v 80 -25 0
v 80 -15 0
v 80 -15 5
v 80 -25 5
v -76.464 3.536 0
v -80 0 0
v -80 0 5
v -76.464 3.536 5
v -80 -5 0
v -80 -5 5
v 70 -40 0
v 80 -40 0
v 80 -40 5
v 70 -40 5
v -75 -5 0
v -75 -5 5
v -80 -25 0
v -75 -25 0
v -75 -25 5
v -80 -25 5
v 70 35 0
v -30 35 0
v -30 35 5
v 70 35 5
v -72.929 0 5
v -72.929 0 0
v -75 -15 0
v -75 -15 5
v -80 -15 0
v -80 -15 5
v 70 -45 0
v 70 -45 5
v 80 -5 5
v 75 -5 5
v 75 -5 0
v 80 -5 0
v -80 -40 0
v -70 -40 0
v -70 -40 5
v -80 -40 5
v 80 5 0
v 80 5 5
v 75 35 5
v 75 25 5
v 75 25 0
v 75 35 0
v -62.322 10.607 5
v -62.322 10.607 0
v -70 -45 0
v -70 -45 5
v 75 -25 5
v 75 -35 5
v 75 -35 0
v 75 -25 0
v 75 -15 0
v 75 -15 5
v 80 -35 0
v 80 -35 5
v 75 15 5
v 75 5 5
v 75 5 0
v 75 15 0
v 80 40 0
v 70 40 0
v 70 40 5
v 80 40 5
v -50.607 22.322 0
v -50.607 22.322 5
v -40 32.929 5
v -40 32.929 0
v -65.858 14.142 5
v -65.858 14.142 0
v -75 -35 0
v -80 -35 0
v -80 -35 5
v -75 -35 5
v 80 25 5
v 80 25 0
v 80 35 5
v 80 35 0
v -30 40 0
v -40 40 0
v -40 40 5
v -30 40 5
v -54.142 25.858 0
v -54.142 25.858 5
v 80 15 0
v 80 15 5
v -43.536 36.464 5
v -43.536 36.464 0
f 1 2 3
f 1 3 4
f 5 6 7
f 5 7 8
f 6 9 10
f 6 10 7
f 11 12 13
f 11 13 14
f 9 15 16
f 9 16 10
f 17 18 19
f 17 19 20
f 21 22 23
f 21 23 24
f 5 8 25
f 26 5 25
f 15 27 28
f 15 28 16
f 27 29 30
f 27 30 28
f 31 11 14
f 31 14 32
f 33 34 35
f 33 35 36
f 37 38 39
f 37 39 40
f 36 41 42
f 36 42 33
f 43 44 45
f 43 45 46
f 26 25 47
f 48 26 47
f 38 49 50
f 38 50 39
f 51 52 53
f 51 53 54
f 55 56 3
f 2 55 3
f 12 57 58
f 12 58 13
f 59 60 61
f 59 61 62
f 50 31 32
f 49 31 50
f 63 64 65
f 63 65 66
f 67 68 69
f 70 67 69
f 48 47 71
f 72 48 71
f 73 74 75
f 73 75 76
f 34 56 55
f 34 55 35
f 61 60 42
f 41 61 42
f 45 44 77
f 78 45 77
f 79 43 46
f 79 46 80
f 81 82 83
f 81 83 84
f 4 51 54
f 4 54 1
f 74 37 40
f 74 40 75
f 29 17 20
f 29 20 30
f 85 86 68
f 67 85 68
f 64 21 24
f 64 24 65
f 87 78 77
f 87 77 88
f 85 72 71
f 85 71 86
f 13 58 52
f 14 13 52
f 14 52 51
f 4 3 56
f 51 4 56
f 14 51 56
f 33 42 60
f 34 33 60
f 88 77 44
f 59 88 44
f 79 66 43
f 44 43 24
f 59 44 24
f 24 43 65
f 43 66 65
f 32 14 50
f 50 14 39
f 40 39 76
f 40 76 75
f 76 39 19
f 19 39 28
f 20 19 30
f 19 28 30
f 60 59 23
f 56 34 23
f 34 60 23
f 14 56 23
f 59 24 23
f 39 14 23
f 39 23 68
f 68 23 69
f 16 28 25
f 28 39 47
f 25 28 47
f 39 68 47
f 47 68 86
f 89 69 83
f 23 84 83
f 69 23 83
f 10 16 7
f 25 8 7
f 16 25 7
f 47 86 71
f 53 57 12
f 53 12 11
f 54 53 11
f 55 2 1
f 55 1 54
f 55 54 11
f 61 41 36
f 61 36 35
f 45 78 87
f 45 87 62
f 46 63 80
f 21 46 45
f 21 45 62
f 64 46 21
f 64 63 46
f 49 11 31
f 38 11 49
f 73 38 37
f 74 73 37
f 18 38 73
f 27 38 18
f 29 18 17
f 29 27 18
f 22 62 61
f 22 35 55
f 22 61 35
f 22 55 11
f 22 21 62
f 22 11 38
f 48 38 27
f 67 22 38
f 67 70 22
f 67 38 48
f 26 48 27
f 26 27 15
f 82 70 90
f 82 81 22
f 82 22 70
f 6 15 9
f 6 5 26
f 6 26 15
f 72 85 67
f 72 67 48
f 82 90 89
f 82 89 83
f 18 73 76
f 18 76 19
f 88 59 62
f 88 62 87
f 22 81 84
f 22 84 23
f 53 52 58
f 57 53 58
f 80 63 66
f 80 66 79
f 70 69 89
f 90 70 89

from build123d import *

# Parameters (mm, degrees)
BOSS_EXTRU_1_DEPTH      = 5
ESQUISSE2_W             = 5
ESQUISSE2_H             = 10
ENL_V_MAT_EXTRU_1_DEPTH = 10
ENL_V_MAT_EXTRU_2_DEPTH = 10


with BuildPart() as part:
    # Esquisse1 → Boss.-Extru.1 (new body)
    with BuildSketch(Plane.XY):
        Polygon((-80, 0), (-40, 40), (-30, 40), (-30, 35), (70, 35), (70, 40), (80, 40), (80, -40), (70, -40), (70, -45), (-70, -45), (-70, -40), (-80, -40), (-80, -35), (-75, -35), (-75, -25), (-80, -25), (-80, -15), (-75, -15), (-75, -5), (-80, -5), align=None)
    extrude(amount=BOSS_EXTRU_1_DEPTH)

    # Esquisse2 → Enlèv. mat.-Extru.1 (cut)
    with BuildSketch(Plane.XY.offset(5)):
        with Locations((77.5, -30)):
            Rectangle(ESQUISSE2_W, ESQUISSE2_H)
        with Locations((77.5, -10)):
            Rectangle(ESQUISSE2_W, ESQUISSE2_H)
        with Locations((77.5, 10)):
            Rectangle(ESQUISSE2_W, ESQUISSE2_H)
        with Locations((77.5, 30)):
            Rectangle(ESQUISSE2_W, ESQUISSE2_H)
    extrude(amount=-ENL_V_MAT_EXTRU_1_DEPTH, mode=Mode.SUBTRACT)

    # Esquisse3 → Enlèv. mat.-Extru.2 (cut)
    with BuildSketch(Plane.XY.offset(5)):
        Polygon((-43.535533906, 36.464466094), (-54.142135624, 25.857864376), (-50.606601718, 22.32233047), (-40, 32.928932188), align=None)
        Polygon((-65.857864376, 14.142135624), (-76.464466094, 3.535533906), (-72.928932188, 0), (-62.32233047, 10.606601718), align=None)
    extrude(amount=-ENL_V_MAT_EXTRU_2_DEPTH, mode=Mode.SUBTRACT)


solid = part.part
